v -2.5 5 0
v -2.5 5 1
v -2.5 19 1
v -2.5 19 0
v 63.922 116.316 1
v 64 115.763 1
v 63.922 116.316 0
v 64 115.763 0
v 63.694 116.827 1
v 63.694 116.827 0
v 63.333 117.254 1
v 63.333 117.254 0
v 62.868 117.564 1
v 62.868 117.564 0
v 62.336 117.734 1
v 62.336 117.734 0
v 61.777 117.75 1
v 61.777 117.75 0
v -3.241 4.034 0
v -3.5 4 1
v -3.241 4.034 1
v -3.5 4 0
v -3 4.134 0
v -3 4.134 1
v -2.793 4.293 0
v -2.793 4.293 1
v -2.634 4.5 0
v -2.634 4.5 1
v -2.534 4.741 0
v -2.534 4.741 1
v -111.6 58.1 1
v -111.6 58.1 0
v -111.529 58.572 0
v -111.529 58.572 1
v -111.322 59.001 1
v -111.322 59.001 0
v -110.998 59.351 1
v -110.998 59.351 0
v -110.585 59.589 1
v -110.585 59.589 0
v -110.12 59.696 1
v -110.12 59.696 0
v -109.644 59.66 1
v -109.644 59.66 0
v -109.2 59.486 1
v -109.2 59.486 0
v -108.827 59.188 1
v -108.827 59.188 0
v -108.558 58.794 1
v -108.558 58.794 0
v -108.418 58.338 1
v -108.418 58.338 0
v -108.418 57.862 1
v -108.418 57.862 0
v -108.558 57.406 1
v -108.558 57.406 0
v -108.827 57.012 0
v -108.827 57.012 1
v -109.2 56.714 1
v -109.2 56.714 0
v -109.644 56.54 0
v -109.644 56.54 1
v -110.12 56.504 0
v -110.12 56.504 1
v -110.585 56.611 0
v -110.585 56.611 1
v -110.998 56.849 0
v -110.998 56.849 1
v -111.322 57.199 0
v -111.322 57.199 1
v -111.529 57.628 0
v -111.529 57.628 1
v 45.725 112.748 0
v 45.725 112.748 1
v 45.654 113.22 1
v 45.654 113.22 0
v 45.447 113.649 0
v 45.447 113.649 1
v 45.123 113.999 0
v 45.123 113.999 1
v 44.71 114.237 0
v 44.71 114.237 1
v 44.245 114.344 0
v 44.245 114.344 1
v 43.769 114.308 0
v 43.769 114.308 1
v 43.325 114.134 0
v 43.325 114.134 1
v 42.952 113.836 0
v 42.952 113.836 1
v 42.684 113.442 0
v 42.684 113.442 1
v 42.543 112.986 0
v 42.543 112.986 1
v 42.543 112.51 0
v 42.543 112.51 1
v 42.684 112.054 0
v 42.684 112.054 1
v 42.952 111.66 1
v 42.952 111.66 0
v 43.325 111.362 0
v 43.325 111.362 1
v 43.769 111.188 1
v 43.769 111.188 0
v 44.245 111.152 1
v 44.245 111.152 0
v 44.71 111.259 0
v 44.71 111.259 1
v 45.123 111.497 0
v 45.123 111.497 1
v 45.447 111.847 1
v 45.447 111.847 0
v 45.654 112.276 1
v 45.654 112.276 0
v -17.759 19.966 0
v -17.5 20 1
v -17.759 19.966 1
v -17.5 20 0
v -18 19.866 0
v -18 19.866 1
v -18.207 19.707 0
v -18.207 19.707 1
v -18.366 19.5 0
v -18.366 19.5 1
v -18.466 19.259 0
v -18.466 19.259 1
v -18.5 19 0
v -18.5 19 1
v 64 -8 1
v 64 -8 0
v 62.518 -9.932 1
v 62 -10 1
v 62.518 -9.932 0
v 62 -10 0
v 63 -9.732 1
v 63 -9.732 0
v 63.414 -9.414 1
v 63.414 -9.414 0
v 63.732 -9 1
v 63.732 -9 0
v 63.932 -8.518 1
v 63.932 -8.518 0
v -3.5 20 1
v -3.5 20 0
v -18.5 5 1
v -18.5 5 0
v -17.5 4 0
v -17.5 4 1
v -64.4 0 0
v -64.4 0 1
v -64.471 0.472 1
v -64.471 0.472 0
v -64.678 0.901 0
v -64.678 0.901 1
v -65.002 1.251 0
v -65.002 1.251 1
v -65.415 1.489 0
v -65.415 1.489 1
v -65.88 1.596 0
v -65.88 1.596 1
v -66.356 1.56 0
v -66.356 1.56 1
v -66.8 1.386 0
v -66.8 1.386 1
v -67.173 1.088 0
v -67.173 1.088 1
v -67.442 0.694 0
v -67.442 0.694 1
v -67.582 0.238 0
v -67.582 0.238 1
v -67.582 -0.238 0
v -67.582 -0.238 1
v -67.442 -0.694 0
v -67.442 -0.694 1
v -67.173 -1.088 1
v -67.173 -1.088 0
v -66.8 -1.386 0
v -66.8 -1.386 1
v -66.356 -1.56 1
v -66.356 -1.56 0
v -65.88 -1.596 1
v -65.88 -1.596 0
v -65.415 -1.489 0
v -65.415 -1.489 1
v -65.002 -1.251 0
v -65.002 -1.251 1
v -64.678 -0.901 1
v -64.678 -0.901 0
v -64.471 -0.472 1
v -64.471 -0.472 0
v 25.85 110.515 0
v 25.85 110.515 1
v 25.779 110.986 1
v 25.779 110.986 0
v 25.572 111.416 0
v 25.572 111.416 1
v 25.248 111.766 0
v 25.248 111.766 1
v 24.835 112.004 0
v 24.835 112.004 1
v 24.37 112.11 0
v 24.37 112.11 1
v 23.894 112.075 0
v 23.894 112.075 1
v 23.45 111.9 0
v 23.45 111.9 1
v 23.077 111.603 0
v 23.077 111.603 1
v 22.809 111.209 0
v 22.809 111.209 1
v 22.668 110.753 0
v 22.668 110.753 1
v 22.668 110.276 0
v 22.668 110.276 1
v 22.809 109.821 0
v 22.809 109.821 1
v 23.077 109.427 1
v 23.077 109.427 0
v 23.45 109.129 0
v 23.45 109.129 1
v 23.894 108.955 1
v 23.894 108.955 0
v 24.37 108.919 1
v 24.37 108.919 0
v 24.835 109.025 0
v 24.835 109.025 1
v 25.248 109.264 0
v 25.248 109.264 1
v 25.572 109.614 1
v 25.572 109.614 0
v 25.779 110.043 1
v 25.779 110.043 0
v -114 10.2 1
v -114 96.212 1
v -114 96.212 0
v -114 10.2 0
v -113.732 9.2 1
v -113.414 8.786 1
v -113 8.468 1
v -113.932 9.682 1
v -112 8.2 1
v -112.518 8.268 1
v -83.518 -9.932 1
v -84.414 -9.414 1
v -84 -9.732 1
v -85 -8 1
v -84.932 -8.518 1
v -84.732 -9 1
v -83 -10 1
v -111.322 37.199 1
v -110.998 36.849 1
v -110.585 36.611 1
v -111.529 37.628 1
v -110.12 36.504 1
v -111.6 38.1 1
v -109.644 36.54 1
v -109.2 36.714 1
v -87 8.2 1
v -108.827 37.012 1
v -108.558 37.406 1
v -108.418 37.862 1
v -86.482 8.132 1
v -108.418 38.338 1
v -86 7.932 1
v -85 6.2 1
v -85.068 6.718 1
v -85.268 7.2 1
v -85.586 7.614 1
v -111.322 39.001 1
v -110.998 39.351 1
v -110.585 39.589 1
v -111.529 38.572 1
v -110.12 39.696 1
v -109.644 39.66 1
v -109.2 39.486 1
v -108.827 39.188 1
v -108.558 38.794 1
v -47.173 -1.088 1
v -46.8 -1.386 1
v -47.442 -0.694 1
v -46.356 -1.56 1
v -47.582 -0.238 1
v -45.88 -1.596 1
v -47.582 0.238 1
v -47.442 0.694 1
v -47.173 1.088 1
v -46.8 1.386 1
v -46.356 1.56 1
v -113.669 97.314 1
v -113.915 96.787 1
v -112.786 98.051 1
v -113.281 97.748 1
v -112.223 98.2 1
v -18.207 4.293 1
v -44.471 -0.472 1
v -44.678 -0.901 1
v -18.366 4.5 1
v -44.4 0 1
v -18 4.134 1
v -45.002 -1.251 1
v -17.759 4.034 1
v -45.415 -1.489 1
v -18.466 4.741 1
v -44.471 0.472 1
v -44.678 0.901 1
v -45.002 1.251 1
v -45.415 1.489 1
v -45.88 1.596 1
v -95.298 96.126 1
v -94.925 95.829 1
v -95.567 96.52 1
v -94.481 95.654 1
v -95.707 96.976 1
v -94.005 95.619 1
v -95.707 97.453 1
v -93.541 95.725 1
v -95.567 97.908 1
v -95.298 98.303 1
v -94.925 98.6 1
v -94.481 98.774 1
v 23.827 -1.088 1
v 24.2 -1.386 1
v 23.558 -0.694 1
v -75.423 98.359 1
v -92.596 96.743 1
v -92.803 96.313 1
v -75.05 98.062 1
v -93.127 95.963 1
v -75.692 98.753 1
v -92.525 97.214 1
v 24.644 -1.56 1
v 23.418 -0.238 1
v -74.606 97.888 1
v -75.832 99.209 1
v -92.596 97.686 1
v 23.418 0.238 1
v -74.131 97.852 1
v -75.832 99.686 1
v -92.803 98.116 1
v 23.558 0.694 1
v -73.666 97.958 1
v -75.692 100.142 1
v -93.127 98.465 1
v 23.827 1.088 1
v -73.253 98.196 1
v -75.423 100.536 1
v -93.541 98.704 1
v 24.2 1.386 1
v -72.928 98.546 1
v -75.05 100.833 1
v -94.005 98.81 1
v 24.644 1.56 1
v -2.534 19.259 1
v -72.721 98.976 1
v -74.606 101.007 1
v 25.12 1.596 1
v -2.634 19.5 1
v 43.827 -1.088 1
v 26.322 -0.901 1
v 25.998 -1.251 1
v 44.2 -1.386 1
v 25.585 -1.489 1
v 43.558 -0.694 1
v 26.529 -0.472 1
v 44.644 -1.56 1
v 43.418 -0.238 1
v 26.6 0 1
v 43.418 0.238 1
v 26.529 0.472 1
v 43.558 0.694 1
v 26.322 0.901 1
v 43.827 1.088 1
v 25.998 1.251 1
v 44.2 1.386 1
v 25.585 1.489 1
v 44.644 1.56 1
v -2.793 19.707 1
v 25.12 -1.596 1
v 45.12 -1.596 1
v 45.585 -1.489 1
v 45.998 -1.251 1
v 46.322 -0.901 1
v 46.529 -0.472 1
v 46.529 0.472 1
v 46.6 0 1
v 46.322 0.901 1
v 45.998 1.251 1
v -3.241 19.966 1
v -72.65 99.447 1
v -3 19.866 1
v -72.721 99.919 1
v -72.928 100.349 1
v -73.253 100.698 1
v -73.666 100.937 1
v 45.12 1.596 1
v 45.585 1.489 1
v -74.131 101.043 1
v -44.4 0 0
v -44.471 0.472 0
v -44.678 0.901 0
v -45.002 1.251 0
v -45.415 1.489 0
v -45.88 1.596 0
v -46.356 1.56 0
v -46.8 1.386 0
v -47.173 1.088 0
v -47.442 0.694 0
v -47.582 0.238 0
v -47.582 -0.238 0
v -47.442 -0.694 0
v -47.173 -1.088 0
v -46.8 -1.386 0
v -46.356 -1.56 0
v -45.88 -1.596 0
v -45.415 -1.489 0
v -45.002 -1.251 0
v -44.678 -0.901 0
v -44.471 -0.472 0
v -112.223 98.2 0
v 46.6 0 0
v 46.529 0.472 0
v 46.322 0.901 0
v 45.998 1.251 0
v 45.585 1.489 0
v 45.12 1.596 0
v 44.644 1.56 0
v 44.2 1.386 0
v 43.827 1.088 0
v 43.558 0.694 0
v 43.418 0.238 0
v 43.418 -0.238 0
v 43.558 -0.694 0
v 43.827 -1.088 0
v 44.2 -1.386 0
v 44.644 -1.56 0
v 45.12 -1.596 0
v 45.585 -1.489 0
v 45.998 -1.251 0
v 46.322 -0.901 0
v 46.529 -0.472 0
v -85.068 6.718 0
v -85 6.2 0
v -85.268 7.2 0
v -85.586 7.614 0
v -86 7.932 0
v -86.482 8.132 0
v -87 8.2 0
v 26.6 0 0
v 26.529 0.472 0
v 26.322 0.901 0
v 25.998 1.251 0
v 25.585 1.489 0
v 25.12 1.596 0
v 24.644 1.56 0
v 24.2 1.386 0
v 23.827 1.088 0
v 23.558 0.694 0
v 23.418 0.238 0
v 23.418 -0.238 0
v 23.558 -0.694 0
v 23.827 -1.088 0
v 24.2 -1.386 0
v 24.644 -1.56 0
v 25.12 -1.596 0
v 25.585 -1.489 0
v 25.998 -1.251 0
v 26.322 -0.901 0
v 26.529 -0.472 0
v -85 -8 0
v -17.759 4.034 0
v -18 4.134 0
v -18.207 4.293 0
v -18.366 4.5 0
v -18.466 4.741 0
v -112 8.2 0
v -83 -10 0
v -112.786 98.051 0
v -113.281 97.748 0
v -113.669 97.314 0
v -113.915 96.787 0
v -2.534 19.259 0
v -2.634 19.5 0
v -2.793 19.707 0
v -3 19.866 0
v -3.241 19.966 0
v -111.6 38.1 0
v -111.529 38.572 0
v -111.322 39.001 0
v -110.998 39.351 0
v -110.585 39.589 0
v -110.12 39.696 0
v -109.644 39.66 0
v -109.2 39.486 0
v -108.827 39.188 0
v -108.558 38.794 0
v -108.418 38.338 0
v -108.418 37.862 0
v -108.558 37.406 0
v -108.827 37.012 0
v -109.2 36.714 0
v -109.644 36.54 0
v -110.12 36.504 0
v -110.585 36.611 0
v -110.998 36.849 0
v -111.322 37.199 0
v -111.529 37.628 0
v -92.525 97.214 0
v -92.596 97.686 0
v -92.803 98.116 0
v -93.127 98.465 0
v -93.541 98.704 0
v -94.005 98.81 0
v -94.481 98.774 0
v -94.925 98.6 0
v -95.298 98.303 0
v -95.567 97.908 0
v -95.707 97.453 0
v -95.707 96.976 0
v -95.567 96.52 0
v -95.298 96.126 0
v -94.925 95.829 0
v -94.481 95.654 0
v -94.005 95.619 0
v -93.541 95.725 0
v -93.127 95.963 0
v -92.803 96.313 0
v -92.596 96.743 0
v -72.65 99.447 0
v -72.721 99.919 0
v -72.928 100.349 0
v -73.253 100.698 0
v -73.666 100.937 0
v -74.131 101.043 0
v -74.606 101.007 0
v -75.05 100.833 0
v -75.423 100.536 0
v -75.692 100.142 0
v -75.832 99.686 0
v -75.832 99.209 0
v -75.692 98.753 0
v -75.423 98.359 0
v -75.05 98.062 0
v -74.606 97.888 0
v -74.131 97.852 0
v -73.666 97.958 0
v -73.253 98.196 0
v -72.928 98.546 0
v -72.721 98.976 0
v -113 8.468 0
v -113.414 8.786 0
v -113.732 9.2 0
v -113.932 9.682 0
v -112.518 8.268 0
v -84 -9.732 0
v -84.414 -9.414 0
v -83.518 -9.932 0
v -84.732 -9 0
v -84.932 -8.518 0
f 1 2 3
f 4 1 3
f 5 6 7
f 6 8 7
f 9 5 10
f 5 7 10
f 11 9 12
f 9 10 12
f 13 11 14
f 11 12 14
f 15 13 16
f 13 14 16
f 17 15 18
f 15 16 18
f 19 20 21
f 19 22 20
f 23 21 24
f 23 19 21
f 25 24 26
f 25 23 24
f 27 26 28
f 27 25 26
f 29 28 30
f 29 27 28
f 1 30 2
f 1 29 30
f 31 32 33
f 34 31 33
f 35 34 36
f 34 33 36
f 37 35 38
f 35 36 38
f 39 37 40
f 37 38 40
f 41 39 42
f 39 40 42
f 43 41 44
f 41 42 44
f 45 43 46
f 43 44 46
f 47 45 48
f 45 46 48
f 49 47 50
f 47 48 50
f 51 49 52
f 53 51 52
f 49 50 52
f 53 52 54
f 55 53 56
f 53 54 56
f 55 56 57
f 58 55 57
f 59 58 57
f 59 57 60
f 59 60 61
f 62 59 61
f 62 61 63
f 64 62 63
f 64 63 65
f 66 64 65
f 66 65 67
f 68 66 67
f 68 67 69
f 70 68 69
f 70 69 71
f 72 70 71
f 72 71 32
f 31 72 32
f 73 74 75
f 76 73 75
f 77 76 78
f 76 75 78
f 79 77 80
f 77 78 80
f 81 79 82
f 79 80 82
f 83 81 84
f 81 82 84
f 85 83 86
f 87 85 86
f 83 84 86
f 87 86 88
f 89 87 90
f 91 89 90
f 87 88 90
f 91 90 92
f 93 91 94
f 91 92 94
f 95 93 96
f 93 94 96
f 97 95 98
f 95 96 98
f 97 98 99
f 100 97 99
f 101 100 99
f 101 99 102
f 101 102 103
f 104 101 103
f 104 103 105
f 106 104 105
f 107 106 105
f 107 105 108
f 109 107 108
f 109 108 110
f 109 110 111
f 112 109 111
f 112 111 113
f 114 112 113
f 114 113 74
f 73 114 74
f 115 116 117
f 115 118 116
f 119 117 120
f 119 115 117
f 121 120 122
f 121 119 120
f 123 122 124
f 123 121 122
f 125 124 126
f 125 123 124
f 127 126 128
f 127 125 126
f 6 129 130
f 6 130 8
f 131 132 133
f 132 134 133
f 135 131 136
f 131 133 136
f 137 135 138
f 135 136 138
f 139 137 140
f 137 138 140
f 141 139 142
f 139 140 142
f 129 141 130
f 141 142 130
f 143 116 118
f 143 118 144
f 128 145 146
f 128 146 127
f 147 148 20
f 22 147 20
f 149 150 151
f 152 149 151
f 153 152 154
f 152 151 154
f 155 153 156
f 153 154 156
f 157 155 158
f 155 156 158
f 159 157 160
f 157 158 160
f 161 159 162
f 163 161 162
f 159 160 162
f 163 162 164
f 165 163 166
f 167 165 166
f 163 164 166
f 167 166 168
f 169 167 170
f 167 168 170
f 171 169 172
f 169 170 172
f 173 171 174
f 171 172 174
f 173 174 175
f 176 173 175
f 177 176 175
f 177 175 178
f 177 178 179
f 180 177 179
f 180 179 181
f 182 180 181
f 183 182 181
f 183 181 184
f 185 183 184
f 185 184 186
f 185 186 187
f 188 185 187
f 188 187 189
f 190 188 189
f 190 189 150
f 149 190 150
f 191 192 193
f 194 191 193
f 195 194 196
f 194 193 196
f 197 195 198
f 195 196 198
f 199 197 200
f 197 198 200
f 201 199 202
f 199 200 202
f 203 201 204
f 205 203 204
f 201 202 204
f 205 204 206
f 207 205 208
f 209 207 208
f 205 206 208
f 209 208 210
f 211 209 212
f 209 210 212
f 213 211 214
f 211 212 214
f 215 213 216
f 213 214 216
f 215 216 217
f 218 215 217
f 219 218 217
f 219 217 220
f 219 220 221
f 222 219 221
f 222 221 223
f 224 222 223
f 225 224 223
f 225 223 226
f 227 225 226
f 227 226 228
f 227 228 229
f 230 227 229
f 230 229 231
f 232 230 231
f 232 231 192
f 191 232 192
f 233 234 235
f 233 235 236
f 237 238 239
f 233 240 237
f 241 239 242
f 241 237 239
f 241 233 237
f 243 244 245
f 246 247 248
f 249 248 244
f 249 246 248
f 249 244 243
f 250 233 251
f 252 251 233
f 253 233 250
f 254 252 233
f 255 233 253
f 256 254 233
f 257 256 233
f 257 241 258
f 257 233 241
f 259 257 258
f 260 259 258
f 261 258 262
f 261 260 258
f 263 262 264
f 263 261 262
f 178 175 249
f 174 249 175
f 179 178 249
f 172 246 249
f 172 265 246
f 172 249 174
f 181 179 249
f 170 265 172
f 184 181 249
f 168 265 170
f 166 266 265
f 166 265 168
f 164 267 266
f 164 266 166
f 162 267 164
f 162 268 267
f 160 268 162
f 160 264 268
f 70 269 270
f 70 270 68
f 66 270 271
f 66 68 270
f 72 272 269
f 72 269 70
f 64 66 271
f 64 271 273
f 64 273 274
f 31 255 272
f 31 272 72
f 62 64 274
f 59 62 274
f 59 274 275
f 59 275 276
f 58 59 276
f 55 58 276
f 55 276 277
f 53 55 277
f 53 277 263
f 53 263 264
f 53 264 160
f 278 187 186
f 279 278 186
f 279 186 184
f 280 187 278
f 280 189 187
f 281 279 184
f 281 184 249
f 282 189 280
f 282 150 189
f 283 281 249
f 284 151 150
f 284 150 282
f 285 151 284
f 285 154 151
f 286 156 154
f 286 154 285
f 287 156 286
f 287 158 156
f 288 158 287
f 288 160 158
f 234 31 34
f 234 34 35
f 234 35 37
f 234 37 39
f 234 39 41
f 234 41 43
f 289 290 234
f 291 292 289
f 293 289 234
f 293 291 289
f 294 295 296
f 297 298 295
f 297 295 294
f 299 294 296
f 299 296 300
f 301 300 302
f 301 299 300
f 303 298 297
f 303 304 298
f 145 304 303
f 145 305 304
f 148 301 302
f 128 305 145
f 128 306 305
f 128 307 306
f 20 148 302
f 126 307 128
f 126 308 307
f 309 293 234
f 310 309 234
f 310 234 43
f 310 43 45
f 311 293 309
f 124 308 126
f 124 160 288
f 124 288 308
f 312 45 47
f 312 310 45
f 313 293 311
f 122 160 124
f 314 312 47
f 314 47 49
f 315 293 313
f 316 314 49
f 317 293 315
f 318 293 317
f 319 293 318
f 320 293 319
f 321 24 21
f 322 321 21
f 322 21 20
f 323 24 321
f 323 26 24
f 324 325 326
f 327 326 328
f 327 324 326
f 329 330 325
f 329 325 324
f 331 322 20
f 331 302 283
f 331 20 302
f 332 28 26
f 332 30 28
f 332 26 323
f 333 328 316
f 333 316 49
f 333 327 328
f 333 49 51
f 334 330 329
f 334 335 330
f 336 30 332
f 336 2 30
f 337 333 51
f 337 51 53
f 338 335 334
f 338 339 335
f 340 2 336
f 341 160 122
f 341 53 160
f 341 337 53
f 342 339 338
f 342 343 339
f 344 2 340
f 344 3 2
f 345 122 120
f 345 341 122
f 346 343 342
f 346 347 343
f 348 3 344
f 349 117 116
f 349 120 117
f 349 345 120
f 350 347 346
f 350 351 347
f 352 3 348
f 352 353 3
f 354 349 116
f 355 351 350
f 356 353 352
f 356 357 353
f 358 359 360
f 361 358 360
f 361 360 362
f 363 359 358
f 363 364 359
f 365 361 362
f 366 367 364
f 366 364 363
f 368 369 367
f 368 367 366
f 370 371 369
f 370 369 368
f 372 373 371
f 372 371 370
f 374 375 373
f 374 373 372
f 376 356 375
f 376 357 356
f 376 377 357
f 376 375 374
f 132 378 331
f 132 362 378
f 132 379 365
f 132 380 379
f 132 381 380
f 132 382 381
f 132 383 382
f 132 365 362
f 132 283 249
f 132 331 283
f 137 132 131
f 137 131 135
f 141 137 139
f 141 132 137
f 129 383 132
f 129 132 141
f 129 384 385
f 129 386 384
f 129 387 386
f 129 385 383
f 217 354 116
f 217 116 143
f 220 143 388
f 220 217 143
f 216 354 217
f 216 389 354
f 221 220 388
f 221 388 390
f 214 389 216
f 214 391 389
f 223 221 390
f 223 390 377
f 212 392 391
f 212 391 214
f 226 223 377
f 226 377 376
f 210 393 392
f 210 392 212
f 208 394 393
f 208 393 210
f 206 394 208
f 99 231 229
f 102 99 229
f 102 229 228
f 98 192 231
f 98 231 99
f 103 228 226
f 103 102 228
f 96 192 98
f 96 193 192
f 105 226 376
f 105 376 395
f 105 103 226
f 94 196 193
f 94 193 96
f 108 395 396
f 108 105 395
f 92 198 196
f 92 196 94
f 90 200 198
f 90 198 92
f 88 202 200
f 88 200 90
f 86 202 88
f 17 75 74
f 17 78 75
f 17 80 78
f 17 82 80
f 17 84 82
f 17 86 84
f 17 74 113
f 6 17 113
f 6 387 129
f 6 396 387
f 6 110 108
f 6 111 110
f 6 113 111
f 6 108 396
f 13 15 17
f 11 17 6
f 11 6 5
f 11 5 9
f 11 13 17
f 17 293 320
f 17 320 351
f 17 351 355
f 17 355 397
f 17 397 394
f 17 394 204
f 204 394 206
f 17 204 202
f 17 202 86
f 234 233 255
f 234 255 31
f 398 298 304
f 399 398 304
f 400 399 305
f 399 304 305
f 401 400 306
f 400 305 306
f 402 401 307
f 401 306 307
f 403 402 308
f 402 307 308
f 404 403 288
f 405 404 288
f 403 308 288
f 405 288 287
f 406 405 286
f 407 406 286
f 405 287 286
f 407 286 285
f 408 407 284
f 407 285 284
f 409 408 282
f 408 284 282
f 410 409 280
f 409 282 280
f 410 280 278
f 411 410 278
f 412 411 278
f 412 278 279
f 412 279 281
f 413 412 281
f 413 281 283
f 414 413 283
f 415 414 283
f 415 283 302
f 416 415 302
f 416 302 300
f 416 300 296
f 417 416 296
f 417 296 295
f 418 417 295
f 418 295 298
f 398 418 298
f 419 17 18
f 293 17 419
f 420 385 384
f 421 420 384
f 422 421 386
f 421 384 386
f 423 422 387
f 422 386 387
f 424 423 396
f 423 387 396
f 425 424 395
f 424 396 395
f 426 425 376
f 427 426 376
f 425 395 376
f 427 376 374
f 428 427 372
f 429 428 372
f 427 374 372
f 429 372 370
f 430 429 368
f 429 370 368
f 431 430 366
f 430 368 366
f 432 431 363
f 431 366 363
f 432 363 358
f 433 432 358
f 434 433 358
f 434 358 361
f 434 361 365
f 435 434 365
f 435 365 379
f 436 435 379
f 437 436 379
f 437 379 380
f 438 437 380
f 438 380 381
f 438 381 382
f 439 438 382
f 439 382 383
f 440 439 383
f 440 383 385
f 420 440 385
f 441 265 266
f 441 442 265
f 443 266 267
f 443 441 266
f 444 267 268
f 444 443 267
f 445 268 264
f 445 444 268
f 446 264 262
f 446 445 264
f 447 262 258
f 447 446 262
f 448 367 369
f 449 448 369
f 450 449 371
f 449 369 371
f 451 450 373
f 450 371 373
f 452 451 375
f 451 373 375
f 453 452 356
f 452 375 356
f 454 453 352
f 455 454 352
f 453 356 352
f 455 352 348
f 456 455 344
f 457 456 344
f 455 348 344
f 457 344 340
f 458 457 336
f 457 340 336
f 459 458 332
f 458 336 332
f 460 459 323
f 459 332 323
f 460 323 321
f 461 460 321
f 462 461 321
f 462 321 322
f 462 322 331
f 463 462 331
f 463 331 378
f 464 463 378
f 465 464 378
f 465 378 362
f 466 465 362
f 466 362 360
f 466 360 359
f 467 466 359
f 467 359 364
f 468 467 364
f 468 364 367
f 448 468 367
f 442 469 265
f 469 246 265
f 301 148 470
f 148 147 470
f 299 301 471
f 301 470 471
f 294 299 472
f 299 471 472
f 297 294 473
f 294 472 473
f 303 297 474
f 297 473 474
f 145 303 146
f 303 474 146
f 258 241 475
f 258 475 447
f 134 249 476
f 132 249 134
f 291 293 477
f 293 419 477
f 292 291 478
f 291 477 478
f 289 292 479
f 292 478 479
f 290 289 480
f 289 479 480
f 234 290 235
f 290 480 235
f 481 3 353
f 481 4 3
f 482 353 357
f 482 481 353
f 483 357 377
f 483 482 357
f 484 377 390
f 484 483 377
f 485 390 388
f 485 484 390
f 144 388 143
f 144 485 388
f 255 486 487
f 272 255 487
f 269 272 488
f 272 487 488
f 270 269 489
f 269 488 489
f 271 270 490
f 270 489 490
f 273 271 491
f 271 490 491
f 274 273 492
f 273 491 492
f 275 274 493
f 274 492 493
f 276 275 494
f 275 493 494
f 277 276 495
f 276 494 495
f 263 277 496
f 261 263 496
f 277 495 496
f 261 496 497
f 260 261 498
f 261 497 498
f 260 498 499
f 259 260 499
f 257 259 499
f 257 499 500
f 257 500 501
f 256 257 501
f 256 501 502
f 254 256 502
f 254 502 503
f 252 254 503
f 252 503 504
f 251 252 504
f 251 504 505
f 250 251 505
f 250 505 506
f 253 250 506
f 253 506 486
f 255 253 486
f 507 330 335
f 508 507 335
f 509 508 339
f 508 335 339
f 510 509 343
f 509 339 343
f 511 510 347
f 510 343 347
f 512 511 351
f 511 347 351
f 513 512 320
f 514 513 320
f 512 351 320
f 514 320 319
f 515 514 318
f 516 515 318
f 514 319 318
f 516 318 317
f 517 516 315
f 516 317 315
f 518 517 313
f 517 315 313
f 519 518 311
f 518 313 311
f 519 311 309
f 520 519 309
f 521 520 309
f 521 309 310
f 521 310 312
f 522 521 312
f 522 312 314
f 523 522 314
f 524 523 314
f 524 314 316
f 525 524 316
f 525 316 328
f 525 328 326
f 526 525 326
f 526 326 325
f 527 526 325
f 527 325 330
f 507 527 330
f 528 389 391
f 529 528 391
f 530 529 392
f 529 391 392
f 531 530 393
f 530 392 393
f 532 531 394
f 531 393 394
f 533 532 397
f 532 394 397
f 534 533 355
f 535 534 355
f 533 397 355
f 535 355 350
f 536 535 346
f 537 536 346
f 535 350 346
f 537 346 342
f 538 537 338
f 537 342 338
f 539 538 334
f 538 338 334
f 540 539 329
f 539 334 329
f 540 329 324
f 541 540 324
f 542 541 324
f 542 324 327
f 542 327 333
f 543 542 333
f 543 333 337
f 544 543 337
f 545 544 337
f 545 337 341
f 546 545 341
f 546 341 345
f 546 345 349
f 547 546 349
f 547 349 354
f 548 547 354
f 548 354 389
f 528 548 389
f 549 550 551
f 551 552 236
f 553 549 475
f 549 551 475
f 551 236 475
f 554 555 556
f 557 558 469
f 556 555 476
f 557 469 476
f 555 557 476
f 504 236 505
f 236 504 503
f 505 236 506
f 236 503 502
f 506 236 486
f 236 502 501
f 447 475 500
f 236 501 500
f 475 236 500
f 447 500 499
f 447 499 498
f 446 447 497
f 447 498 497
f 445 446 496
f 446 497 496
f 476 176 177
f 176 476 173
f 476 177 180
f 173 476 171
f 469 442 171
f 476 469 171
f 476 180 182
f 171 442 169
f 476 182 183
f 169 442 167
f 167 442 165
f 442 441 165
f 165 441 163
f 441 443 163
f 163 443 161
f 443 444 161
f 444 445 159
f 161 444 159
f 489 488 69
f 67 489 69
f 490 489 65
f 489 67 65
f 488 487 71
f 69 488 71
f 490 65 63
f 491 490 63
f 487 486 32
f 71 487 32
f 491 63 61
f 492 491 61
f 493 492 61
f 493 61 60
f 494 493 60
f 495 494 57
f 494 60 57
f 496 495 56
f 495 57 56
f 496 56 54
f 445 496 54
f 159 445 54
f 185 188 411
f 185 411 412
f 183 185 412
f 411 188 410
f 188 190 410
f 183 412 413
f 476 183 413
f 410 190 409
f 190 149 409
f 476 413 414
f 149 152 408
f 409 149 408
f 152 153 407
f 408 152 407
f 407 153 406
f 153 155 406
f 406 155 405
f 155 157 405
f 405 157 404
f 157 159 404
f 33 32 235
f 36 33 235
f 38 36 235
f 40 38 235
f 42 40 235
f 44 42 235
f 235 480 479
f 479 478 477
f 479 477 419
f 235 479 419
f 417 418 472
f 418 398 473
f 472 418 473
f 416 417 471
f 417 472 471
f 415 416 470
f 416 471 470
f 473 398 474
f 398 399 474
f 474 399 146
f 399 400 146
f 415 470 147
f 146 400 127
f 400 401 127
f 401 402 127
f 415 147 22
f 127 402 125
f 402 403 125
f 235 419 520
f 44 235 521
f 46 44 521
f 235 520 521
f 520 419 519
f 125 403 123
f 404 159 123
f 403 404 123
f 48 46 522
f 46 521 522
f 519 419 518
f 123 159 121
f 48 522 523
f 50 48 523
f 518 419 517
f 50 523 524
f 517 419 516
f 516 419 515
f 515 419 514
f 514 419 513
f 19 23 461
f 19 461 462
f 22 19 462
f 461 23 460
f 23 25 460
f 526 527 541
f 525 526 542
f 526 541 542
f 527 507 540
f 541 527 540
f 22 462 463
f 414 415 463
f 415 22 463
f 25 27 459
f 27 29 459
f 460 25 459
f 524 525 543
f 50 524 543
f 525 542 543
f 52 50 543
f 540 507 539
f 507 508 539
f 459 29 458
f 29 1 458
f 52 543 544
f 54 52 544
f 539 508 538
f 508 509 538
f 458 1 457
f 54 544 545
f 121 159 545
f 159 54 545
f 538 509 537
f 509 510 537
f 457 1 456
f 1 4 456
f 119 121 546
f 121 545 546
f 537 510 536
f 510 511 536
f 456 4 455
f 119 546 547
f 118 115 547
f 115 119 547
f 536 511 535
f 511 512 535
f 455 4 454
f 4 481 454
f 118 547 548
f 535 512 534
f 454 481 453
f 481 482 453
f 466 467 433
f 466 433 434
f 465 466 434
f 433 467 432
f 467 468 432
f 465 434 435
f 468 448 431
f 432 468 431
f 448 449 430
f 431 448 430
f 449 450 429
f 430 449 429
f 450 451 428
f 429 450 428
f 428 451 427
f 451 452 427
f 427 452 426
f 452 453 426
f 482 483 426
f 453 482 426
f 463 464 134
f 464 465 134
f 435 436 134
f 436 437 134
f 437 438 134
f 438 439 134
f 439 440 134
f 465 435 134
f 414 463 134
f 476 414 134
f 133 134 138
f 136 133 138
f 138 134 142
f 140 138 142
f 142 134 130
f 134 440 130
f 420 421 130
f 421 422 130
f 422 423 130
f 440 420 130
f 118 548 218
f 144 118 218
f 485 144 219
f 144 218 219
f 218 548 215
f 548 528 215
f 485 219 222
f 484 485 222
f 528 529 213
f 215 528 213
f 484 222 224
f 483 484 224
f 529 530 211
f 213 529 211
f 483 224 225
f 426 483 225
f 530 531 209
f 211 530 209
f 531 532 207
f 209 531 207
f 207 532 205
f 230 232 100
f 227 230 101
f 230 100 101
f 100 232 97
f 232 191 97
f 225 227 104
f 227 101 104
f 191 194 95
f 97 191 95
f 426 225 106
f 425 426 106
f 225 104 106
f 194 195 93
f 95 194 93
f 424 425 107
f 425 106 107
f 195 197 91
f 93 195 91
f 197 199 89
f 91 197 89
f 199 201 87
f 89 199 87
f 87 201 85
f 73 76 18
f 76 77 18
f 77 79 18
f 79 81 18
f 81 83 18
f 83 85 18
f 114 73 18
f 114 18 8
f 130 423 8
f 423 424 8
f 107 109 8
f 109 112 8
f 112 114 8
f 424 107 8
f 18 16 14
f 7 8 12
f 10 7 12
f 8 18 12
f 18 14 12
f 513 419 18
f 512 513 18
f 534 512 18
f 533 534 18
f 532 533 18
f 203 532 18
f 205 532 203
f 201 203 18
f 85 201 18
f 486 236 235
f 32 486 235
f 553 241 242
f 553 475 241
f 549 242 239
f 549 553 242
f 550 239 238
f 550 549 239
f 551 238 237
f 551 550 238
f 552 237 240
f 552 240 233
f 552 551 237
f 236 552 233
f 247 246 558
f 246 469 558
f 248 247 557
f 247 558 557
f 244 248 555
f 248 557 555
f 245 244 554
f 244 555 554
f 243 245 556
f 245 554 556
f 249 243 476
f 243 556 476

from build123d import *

# Parameters (mm, degrees)
SKETCH_1_W          = 90
SKETCH_1_H          = 14
EXTRUDE_1_DEPTH     = 1
EXTRUDE_2_DEPTH     = 1
SKETCH_4_W          = 40
SKETCH_4_H          = 14
SKETCH_4_W_2        = 19
EXTRUDE_3_DEPTH     = 1
SKETCH_7_R          = 1.6
CUT_EXTRUDE_1_DEPTH = 10
SKETCH_8_R          = 1.6
CUT_EXTRUDE_2_DEPTH = 10
SKETCH_9_R          = 1.6
CUT_EXTRUDE_3_DEPTH = 10
FILLET_1_R          = 2
SKETCH_10_W         = 16
SKETCH_10_H         = 16
CUT_EXTRUDE_4_DEPTH = 10
FILLET_2_R          = 1


with BuildPart() as part:
    # 草图1 → 凸台-拉伸1 (new body)
    with BuildSketch(Plane.XY):
        with Locations((0, -3)):
            Rectangle(SKETCH_1_W, SKETCH_1_H)
    extrude(amount=EXTRUDE_1_DEPTH)

    # 草图2 → 凸台-拉伸2 (add)
    with BuildSketch(Plane.XY.offset(1)):
        Polygon((-85, 8.2), (-85, 4), (64, 4), (64, 118), (-114, 98), (-114, 8.2), align=None)
    extrude(amount=-EXTRUDE_2_DEPTH)

    # 草图4 → 凸台-拉伸3 (add)
    with BuildSketch(Plane.XY.offset(1)):
        with Locations((-65, -3)):
            Rectangle(SKETCH_4_W, SKETCH_4_H)
        with Locations((54.5, -3)):
            Rectangle(SKETCH_4_W_2, SKETCH_4_H)
    extrude(amount=-EXTRUDE_3_DEPTH)

    # 草图7 → 切除-拉伸1 (cut)
    with BuildSketch(Plane.XY.offset(1)):
        with Locations((45, 0)):
            Circle(SKETCH_7_R)
        with Locations((25, 0)):
            Circle(SKETCH_7_R)
        with Locations((-66, 0)):
            Circle(SKETCH_7_R)
        with Locations((-46, 0)):
            Circle(SKETCH_7_R)
    extrude(amount=-CUT_EXTRUDE_1_DEPTH, mode=Mode.SUBTRACT)

    # 草图8 → 切除-拉伸2 (cut)
    with BuildSketch(Plane.XY.offset(1)):
        with Locations((-94.125063758, 97.214261295)):
            Circle(SKETCH_8_R)
        with Locations((-74.250127515, 99.447400198)):
            Circle(SKETCH_8_R)
        with Locations((24.250127515, 110.514844584)):
            Circle(SKETCH_8_R)
        with Locations((44.125063758, 112.747983487)):
            Circle(SKETCH_8_R)
    extrude(amount=-CUT_EXTRUDE_2_DEPTH, mode=Mode.SUBTRACT)

    # 草图9 → 切除-拉伸3 (cut)
    with BuildSketch(Plane(origin=(0, 0, 0), x_dir=(-1, 0, 0), z_dir=(0, 0, -1))):
        with Locations((110, 58.1)):
            Circle(SKETCH_9_R)
        with Locations((110, 38.1)):
            Circle(SKETCH_9_R)
    extrude(amount=-CUT_EXTRUDE_3_DEPTH, mode=Mode.SUBTRACT)

    # 圆角1
    fillet_1_edges = [part.edges().sort_by_distance(p)[0] for p in [
        (-114, 8.2, 0.5),
        (-114, 98, 0.5),
        (64, 118, 0.5),
        (-85, 8.2, 0.5),
        (-85, -10, 0.5),
        (64, -10, 0.5),
    ]]
    fillet(fillet_1_edges, radius=FILLET_1_R)

    # 草图10 → 切除-拉伸4 (cut)
    with BuildSketch(Plane.XY.offset(1)):
        with Locations((-10.5, 12)):
            Rectangle(SKETCH_10_W, SKETCH_10_H)
    extrude(amount=-CUT_EXTRUDE_4_DEPTH, mode=Mode.SUBTRACT)

    # 圆角2
    fillet_2_edges = [part.edges().sort_by_distance(p)[0] for p in [
        (-2.5, 20, 0.5),
        (-2.5, 4, 0.5),
        (-18.5, 4, 0.5),
        (-18.5, 20, 0.5),
    ]]
    fillet(fillet_2_edges, radius=FILLET_2_R)


solid = part.part
